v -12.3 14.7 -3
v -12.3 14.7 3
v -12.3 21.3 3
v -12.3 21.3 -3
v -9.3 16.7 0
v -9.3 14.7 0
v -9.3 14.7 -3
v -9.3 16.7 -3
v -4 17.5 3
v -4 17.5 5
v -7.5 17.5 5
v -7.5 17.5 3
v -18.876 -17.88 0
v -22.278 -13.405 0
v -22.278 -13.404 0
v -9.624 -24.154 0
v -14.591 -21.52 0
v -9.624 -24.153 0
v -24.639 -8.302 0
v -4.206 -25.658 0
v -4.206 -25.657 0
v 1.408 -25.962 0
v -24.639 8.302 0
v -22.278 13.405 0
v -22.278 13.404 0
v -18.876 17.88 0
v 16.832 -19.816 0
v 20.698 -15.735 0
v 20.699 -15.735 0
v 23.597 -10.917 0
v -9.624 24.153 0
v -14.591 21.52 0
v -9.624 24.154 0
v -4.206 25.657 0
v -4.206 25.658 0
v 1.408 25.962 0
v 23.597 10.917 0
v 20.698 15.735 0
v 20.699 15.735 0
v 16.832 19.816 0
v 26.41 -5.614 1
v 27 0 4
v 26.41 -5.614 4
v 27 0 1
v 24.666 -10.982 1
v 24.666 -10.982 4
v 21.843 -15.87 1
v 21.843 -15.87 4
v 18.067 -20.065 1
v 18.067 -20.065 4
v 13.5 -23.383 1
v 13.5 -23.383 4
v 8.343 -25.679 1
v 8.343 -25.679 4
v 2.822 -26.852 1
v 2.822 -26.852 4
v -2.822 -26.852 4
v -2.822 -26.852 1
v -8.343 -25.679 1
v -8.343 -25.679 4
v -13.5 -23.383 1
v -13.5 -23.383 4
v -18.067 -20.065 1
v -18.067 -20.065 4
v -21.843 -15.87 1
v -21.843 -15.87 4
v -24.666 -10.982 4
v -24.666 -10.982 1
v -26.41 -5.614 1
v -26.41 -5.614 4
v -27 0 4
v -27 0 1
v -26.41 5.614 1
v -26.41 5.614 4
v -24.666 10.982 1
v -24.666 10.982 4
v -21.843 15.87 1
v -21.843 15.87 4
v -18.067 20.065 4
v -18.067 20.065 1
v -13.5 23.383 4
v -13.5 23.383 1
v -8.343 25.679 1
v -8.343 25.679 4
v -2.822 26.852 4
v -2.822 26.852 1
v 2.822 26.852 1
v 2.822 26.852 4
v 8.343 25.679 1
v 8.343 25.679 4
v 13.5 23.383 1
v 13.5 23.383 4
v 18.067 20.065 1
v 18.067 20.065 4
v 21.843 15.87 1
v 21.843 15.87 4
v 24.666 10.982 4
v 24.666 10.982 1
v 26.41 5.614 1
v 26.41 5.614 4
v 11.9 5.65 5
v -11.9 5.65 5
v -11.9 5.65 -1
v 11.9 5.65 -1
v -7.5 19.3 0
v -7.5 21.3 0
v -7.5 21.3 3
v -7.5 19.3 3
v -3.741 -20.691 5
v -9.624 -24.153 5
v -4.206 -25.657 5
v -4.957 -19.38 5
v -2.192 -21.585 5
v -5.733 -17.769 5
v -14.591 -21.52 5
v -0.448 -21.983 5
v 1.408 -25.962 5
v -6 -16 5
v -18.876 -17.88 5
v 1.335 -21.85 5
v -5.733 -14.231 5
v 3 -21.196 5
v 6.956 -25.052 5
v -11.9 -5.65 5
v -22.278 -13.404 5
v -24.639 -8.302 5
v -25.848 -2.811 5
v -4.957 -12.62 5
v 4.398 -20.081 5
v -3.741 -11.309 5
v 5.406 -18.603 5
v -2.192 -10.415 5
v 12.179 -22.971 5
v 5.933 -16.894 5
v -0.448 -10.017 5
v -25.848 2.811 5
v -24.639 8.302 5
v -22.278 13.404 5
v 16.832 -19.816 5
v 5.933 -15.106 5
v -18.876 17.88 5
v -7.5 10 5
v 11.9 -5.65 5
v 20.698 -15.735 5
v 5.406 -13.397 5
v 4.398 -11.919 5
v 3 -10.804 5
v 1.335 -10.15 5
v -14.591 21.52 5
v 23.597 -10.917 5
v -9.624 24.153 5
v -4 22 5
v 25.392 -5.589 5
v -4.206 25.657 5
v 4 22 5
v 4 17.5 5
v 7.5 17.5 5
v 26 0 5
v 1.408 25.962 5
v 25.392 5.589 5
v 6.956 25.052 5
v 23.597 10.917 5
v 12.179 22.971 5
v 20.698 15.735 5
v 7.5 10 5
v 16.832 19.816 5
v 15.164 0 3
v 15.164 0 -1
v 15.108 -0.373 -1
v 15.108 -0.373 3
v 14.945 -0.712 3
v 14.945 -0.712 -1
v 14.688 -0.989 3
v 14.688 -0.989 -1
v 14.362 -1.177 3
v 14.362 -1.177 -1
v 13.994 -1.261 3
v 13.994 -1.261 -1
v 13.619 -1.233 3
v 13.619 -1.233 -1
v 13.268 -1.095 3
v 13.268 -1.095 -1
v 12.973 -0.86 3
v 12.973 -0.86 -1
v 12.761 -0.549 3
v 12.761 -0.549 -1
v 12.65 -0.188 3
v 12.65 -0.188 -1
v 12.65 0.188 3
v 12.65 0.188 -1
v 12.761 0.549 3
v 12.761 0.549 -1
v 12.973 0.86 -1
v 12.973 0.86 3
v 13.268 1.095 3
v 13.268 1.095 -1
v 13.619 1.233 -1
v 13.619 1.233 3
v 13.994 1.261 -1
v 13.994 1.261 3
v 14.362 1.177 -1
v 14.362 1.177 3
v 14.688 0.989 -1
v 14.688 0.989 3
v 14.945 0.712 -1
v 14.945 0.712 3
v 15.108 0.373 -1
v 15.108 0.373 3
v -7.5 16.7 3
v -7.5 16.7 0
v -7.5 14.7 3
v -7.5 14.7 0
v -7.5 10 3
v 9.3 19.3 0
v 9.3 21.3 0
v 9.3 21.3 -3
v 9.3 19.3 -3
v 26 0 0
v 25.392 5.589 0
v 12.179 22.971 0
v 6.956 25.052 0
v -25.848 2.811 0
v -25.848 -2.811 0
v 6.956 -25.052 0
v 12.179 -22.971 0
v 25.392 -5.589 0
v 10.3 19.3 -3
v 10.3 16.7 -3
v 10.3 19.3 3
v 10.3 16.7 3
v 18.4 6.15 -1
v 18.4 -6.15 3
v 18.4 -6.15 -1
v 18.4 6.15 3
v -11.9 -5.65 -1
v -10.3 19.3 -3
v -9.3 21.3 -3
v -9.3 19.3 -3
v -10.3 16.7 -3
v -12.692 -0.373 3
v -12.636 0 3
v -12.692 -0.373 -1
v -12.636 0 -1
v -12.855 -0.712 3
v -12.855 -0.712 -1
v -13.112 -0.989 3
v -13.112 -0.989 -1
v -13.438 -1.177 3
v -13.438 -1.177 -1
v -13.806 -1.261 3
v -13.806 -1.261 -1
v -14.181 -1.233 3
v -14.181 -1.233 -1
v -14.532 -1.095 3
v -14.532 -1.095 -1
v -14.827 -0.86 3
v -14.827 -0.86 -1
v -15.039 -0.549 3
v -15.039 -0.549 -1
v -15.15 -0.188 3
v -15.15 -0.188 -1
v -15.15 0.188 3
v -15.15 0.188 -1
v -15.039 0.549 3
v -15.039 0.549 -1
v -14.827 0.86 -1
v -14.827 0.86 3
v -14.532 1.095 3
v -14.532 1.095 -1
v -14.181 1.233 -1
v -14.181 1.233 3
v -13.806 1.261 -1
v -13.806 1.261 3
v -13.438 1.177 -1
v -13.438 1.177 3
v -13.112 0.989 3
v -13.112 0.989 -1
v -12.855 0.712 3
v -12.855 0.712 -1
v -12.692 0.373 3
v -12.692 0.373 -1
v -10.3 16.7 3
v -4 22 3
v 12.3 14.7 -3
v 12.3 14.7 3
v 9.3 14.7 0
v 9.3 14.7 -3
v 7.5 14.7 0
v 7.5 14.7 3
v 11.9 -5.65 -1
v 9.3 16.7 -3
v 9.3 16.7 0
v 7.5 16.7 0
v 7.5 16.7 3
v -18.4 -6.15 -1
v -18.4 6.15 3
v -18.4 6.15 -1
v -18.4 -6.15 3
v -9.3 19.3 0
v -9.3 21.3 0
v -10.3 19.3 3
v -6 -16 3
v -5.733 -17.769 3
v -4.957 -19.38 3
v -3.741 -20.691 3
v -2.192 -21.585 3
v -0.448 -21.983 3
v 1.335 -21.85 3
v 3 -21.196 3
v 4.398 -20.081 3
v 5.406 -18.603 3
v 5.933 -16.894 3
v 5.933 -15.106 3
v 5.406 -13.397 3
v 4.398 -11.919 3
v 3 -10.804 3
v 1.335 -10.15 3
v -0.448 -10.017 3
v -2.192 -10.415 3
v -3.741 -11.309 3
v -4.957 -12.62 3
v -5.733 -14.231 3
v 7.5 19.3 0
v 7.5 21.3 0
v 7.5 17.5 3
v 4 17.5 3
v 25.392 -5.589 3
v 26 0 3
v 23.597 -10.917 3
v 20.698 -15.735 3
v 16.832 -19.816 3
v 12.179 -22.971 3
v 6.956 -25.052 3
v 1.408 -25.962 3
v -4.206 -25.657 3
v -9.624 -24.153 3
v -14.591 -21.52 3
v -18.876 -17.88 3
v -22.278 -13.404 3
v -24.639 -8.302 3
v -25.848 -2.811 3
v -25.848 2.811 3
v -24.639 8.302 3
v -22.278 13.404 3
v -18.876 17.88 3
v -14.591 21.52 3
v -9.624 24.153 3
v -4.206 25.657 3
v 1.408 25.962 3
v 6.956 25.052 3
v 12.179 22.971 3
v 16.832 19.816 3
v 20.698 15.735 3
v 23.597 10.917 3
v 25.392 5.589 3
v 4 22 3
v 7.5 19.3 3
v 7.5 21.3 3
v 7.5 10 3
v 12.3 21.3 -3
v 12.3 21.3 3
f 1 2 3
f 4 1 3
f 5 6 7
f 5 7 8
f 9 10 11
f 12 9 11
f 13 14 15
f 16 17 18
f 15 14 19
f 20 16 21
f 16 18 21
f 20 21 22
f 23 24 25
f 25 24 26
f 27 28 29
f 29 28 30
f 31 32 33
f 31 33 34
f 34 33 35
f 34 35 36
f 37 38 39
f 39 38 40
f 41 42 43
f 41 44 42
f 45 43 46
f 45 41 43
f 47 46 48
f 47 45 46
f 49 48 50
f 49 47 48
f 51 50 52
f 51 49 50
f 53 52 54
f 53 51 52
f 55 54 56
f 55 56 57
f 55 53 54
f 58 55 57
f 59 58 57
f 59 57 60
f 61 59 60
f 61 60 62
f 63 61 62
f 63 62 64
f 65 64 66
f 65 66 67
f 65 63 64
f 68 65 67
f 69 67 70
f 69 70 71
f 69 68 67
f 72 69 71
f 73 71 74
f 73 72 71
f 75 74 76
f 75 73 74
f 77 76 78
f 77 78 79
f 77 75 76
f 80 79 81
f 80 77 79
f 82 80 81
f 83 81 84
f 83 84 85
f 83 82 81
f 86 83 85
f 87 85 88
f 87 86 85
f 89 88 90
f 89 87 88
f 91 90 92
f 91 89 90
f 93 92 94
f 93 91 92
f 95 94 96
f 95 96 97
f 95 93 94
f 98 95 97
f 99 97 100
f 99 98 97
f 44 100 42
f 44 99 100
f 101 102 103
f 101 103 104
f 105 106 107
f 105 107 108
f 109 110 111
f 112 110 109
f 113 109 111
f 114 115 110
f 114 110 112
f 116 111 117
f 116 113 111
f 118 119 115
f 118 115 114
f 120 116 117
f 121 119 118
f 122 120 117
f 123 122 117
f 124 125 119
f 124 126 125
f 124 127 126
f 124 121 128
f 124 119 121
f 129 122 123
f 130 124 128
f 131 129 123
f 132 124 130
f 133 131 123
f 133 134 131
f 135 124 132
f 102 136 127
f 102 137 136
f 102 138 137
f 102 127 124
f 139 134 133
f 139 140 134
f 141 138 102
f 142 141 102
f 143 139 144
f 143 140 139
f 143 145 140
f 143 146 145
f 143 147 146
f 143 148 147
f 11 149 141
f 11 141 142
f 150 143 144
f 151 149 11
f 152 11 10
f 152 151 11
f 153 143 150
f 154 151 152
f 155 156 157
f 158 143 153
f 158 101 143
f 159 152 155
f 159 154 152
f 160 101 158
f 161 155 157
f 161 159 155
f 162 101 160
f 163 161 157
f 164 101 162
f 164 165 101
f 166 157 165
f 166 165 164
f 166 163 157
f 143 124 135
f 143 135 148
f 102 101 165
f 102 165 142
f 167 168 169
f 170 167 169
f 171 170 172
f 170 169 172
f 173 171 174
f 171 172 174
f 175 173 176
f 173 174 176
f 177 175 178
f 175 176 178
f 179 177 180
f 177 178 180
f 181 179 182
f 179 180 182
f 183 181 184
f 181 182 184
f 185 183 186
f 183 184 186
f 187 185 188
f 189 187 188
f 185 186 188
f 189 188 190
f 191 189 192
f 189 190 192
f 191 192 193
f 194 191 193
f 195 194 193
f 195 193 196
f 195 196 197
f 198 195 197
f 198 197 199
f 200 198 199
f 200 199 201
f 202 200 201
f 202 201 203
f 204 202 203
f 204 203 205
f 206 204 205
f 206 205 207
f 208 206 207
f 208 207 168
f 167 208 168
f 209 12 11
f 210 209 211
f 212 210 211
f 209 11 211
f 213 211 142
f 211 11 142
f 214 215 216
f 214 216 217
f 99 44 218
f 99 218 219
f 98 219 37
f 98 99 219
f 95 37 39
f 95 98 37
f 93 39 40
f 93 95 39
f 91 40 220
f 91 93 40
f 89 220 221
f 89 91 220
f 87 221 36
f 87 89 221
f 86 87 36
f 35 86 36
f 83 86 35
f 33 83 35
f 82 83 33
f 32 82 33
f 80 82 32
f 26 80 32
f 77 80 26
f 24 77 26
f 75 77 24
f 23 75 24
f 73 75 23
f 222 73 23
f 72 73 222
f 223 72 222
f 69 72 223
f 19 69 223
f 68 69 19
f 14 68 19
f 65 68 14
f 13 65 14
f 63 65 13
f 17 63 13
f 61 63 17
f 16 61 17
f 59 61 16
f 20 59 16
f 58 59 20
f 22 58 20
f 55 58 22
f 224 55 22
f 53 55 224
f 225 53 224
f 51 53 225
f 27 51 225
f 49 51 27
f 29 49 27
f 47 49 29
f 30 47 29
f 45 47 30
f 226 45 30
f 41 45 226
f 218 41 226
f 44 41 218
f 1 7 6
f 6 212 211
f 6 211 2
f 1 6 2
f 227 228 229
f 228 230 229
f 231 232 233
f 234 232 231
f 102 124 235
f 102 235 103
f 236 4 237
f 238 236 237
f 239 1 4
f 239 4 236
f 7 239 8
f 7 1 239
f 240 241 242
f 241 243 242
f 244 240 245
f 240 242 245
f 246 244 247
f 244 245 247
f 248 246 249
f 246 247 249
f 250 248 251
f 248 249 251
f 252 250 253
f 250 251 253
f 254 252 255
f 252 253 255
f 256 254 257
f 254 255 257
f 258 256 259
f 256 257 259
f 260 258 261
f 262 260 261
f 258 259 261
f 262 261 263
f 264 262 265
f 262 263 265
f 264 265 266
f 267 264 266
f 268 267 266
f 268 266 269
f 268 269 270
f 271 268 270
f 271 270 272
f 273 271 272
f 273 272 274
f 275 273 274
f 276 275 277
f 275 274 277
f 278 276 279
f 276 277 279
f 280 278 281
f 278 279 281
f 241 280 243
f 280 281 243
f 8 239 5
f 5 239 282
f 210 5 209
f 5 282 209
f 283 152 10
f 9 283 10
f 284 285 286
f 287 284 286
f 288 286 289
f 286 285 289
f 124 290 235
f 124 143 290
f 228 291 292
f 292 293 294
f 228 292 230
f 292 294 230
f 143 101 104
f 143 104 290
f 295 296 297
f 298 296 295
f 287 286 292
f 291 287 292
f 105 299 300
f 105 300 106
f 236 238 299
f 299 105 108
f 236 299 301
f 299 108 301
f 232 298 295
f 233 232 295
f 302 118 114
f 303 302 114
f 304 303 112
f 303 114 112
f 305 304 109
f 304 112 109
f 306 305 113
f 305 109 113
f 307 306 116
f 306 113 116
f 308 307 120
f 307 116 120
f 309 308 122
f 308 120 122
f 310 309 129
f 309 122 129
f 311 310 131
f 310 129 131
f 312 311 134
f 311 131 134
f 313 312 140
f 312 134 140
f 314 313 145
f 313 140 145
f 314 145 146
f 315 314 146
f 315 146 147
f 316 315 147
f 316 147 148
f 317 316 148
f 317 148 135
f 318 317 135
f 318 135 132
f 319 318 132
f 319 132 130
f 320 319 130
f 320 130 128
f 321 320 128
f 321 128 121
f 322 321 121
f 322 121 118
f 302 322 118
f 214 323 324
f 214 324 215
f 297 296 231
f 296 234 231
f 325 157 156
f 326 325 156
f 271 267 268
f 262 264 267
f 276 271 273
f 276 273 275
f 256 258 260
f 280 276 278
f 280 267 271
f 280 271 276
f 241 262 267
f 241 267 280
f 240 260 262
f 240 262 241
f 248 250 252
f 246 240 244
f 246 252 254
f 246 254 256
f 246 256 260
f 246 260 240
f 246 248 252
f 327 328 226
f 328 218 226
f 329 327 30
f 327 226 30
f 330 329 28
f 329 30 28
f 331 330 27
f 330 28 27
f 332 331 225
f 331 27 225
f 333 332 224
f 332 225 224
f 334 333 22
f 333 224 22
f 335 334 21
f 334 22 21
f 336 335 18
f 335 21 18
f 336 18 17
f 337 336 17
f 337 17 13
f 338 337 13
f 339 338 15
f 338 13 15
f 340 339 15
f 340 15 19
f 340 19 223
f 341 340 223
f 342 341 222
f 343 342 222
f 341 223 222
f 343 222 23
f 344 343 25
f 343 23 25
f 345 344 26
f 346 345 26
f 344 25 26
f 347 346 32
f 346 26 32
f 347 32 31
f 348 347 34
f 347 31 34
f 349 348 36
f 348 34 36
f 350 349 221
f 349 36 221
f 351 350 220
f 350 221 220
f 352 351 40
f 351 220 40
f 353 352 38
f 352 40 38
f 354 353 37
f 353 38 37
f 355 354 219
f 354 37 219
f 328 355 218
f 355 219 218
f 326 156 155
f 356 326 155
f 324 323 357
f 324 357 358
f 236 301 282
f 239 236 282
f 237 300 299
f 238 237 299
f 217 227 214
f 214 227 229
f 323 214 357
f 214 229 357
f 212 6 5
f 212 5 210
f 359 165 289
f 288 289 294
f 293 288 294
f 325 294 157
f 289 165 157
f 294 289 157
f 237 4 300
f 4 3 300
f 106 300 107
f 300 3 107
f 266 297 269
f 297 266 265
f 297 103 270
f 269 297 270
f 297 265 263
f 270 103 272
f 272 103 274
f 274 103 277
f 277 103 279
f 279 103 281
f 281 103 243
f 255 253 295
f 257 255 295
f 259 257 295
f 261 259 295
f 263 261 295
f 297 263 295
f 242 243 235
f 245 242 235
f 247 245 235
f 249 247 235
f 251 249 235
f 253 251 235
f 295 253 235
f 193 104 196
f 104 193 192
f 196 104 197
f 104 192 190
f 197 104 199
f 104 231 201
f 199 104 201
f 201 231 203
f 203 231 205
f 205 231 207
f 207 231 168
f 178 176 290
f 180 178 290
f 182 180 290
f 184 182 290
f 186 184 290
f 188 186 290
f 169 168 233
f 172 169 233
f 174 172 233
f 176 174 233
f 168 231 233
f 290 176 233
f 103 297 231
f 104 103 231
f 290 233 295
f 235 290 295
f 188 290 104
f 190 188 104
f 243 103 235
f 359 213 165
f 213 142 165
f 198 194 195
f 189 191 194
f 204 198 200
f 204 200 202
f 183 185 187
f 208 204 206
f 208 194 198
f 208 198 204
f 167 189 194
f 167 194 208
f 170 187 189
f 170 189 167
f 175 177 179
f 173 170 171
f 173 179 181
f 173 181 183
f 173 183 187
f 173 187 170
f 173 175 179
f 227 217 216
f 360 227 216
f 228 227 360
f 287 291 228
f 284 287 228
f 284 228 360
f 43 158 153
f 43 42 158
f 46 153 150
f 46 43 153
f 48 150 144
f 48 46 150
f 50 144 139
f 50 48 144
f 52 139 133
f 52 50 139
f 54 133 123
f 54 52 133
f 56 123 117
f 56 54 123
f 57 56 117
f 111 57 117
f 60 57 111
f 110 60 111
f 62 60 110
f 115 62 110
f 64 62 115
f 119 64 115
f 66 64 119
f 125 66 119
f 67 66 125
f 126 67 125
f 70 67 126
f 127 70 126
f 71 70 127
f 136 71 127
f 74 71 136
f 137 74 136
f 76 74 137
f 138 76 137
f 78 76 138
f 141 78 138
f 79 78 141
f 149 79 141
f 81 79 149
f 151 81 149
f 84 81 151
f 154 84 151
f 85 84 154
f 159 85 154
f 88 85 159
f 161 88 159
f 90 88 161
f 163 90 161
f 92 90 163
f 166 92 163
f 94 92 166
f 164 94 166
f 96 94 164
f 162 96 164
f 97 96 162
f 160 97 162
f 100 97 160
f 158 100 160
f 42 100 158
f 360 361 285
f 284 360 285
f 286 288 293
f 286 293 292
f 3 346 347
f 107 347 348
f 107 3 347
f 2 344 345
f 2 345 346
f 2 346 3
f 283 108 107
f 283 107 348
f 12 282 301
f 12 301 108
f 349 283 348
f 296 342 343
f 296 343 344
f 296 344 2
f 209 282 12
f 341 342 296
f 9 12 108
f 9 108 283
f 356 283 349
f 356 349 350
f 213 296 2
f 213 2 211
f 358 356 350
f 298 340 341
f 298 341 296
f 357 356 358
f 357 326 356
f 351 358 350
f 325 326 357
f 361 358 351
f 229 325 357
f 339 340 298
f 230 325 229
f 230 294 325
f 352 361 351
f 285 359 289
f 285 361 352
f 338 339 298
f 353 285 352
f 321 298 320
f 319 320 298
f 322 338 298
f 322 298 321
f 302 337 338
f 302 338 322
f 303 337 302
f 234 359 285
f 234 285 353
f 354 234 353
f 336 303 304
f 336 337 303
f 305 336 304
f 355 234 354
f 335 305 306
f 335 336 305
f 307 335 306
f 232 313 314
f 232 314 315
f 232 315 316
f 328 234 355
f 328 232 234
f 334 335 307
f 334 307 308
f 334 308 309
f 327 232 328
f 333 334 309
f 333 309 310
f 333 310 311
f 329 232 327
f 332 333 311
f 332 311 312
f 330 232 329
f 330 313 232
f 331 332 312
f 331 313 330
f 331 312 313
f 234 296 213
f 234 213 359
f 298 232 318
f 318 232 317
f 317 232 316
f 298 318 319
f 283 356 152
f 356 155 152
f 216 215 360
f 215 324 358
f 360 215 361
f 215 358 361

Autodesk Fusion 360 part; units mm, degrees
sketch "Boceto1" plane through (0, 0, 0) normal (0, 0, 1) x (1, 0, 0)
  circle A0 centre (0, 0) radius 27
  dimension "d1" = 54
extrude "Extruir1" add sketch "Boceto1" along normal blind 5
sketch "Boceto2" plane through (0, 0, 0) normal (0, 0, -1) x (1, 0, 0)
  circle A0 centre (0, 0) radius 27
  circle A1 centre (0, 0) radius 26
  dimension "d6" = 52
extrude "Extruir2" cut sketch "Boceto2" against normal blind 3 contours A1
sketch "Boceto3" plane through (0, 0, 5) normal (0, 0, 1) x (-1, 0, 0)
  circle A0 centre (0, 0) radius 27
  line L0 (-11.4, 5.15) -> (11.4, 5.15)
  line L1 (11.4, 5.15) -> (11.4, -5.15)
  line L2 (11.4, -5.15) -> (-11.4, -5.15)
  line L3 (-11.4, -5.15) -> (-11.4, 5.15)
  line L4 (-11.4, 5.15) -> (11.4, -5.15) construction
  line L5 (11.4, 5.15) -> (-11.4, -5.15) construction
  line L6 (0, -27) -> (0, 27) construction
  line L7 (0, 5.15) -> (0, 16) construction
  circle A1 centre (0, 16) radius 6
  dimension "d9" = 10.3
  dimension "d10" = 22.8
  dimension "d11" = 12
extrude "Extruir3" cut sketch "Boceto3" against normal blind 3 contours L0 L1 L2 L3 | A1
sketch "Boceto4" plane through (0, 0, 3) normal (0, 0, -1) x (1, 0, 0)
  circle A0 centre (0, 16) radius 6
  line L0 (-11.4, -5.15) -> (-11.4, 5.15)
  line L1 (-11.4, 5.15) -> (11.4, 5.15)
  line L2 (11.4, 5.15) -> (11.4, -5.15)
  line L3 (11.4, -5.15) -> (-11.4, -5.15)
  circle A1 centre (0, 0) radius 26
  line L4 (-12.4, 6.15) -> (12.4, 6.15)
  line L5 (12.4, 6.15) -> (12.4, -6.15)
  line L6 (12.4, -6.15) -> (-12.4, -6.15)
  line L7 (-12.4, -6.15) -> (-12.4, 6.15)
  line L8 (-12.4, 6.15) -> (12.4, -6.15) construction
  line L9 (12.4, 6.15) -> (-12.4, -6.15) construction
  dimension "d14" = 24.8
  dimension "d15" = 12.3
extrude "Extruir4" add sketch "Boceto4" along normal blind 4 contours L4 L5 L6 L7
chamfer "Chaflán1" distance 1 angle 45 1 edges at (-25.1728, -9.7636, 5)
extrude "Extruir5" add 1 faces at (12.4, -2.05, 0.3333) along direction (1, 0, 0) blind 5
extrude "Extruir6" add 1 faces at (-12.4, 2.05, 0.3333) along direction (-1, 0, 0) blind 5
extrude "Extruir7" add 1 faces at (17.4, -2.05, 0.3333) along direction (1, 0, 0) blind 1
extrude "Extruir8" add 1 faces at (-17.4, 2.05, 0.3333) along direction (-1, 0, 0) blind 1
chamfer "Chaflán2" distance 1 angle 45 1 edges at (-25.1728, -9.7636, 0)
sketch "Boceto5" plane through (0, 0, 5) normal (0, 0, 1) x (-1, 0, 0)
  line L0 (11.4, 5.15) -> (11.4, -5.15)
  line L1 (11.4, -5.15) -> (-11.4, -5.15)
  line L2 (-11.4, -5.15) -> (-11.4, 5.15)
  line L3 (-11.4, 5.15) -> (11.4, 5.15)
  circle A0 centre (0, 16) radius 6
  circle A1 centre (0, 0) radius 26
  line L4 (0, 0) -> (0, -16)
  line L5 (7.5, -10) -> (-7.5, -10)
  line L6 (-7.5, -10) -> (-7.5, -22)
  line L7 (-7.5, -22) -> (7.5, -22)
  line L8 (7.5, -22) -> (7.5, -10)
  line L9 (7.5, -10) -> (-7.5, -22) construction
  line L10 (-7.5, -10) -> (7.5, -22) construction
  line L11 (-7.5, -10) -> (-7.5, -17.5)
  line L12 (-7.5, -17.5) -> (7.5, -17.5)
  line L13 (0, -17.5) -> (-4, -17.5)
  line L14 (-4, -17.5) -> (-4, -22)
  line L15 (-4, -22) -> (4, -22)
  line L16 (4, -22) -> (4, -17.5)
  point P0 (0, -16)
  dimension "d28" = 16
  dimension "d29" = 15
  dimension "d30" = 12
  dimension "d31" = 7.5
extrude "Extruir9" cut sketch "Boceto5" against normal blind 2 contours L5 L6 L8 L11 L12 L13 | L7 L12 L13 L14 L15 L16
sketch "Boceto6" plane through (0, 0, 3) normal (0, 0, -1) x (1, 0, 0)
  line L0 (-4, -17.5) -> (-7.5, -17.5)
  line L1 (-7.5, -17.5) -> (-7.5, -10)
  line L2 (-7.5, -10) -> (7.5, -10)
  line L3 (7.5, -10) -> (7.5, -17.5)
  line L4 (7.5, -17.5) -> (4, -17.5)
  line L5 (4, -17.5) -> (4, -22)
  line L6 (4, -22) -> (-4, -22)
  line L7 (-4, -22) -> (-4, -17.5)
  line L8 (-18.4, 6.15) -> (18.4, 6.15)
  line L9 (18.4, 6.15) -> (18.4, -6.15)
  line L10 (18.4, -6.15) -> (-18.4, -6.15)
  line L11 (-18.4, -6.15) -> (-18.4, 6.15)
  circle A0 centre (0, 16) radius 6
  circle A1 centre (0, 0) radius 26
  line L12 (4, -22) -> (4, -19)
  line L13 (0, -19) -> (10, -19)
  line L14 (10.3, -19.3) -> (10.3, -16.7)
  line L15 (-10.3, -16.7) -> (10.3, -16.7)
  line L16 (-10.3, -19.3) -> (-10.3, -16.7)
  line L17 (10.3, -19.3) -> (-10.3, -19.3)
  line L18 (12.3, -21.3) -> (12.3, -14.7)
  line L19 (-12.3, -14.7) -> (12.3, -14.7)
  line L20 (-12.3, -21.3) -> (-12.3, -14.7)
  line L21 (12.3, -21.3) -> (-12.3, -21.3)
  dimension "d35" = -2
extrude "Extruir10" add sketch "Boceto6" along normal blind 3 contours L1 L7 L15 L16 L17 L19 L20 L21 | L3 L5 L12 L14 L15 L17 L18 L19 L21
sketch "Boceto7" plane through (0, 0, 0) normal (0, 0, -1) x (1, 0, 0)
  line L0 (7.5, -14.7) -> (7.5, -16.7)
  line L1 (7.5, -16.7) -> (10.3, -16.7)
  line L2 (10.3, -16.7) -> (10.3, -19.3)
  line L3 (10.3, -19.3) -> (4, -19.3)
  line L4 (4, -19.3) -> (4, -21.3)
  line L5 (4, -21.3) -> (12.3, -21.3)
  line L6 (12.3, -21.3) -> (12.3, -14.7)
  line L7 (12.3, -14.7) -> (7.5, -14.7)
  line L8 (4, -19.3) -> (7.5002, -19.3)
  line L9 (7.5002, -19.3) -> (7.5002, -21.3)
  line L10 (7.5002, -21.3) -> (4, -21.3)
  line L11 (4, -21.3) -> (4, -19.3)
extrude "Extruir11" cut sketch "Boceto7" against normal blind 3 contours L3 L4 L5 L8 L9 L10 L11
sketch "Boceto8" plane through (0, 0, 0) normal (0, 0, -1) x (1, 0, 0)
  line L0 (-12.3, -21.3) -> (-4, -21.3)
  line L1 (-4, -21.3) -> (-4, -19.3)
  line L2 (-4, -19.3) -> (-10.3, -19.3)
  line L3 (-10.3, -19.3) -> (-10.3, -16.7)
  line L4 (-10.3, -16.7) -> (-7.5, -16.7)
  line L5 (-7.5, -16.7) -> (-7.5, -14.7)
  line L6 (-7.5, -14.7) -> (-12.3, -14.7)
  line L7 (-12.3, -14.7) -> (-12.3, -21.3)
  line L8 (-4, -21.3) -> (-7.5, -21.3)
  line L9 (-7.5, -21.3) -> (-7.5, -19.3)
  line L10 (-7.5, -19.3) -> (-4, -19.3)
  line L11 (-4, -19.3) -> (-4, -21.3)
  line L12 (-12.3, -14.7) -> (-10.3, -14.7)
  line L13 (-10.3, -14.7) -> (-10.3, -21.3)
  line L14 (-10.3, -21.3) -> (-12.3, -21.3)
  line L15 (-12.3, -21.3) -> (-12.3, -14.7)
  line L16 (-10.3, -14.7) -> (-9.3, -14.7)
  line L17 (-9.3, -14.7) -> (-9.3, -16.7)
  line L18 (-9.3, -16.7) -> (-10.3, -16.7)
  line L19 (-10.3, -16.7) -> (-10.3, -14.7)
  line L20 (-10.3, -21.3) -> (-9.3, -21.3)
  line L21 (-9.3, -21.3) -> (-9.3, -19.3)
  line L22 (-9.3, -19.3) -> (-10.3, -19.3)
  line L23 (-10.3, -19.3) -> (-10.3, -21.3)
  dimension "d42" = 1
  dimension "d43" = 1
extrude "Extruir12" cut sketch "Boceto8" against normal blind 3 contours L0 L1 L2 L8 L9 L10 L11
extrude "Extruir14" add sketch "Boceto8" along normal blind 3 contours L0 L3 L6 L7 L12 L13 L14 L15 L19 L23 | L0 L2 L13 L20 L21 L22 L23 | L4 L6 L13 L16 L17 L18 L19
sketch "Boceto9" plane through (0, 0, 0) normal (0, 0, -1) x (1, 0, 0)
  line L0 (7.5002, -19.3) -> (7.5002, -21.3)
  line L1 (7.5002, -21.3) -> (12.3, -21.3)
  line L2 (12.3, -21.3) -> (12.3, -14.7)
  line L3 (12.3, -14.7) -> (7.5, -14.7)
  line L4 (7.5, -14.7) -> (7.5, -16.7)
  line L5 (7.5, -16.7) -> (10.3, -16.7)
  line L6 (10.3, -16.7) -> (10.3, -19.3)
  line L7 (10.3, -19.3) -> (7.5002, -19.3)
  line L8 (12.3, -14.7) -> (9.3, -14.7)
  line L9 (9.3, -14.7) -> (9.3, -16.7)
  line L10 (9.3, -16.7) -> (12.3, -16.7)
  line L11 (12.3, -16.7) -> (12.3, -14.7)
  line L12 (12.3, -21.3) -> (9.3, -21.3)
  line L13 (9.3, -21.3) -> (9.3, -19.3)
  line L14 (9.3, -19.3) -> (12.3, -19.3)
  line L15 (12.3, -19.3) -> (12.3, -21.3)
  dimension "d48" = 3
  dimension "d49" = 3
extrude "Extruir15" add sketch "Boceto9" along normal blind 3 contours L1 L2 L7 L12 L13 L14 L15 | L2 L6 L10 L14 | L2 L3 L5 L8 L9 L10 L11
sketch "Boceto10" plane through (0, 0, -1) normal (0, 0, -1) x (1, 0, 0)
  line L0 (11.4, 5.15) -> (11.4, -5.15)
  line L1 (11.4, -5.15) -> (-11.4, -5.15)
  line L2 (-11.4, -5.15) -> (-11.4, 5.15)
  line L3 (-11.4, 5.15) -> (11.4, 5.15)
  line L4 (-18.4, -6.15) -> (18.4, -6.15)
  line L5 (18.4, -6.15) -> (18.4, 6.15)
  line L6 (18.4, 6.15) -> (-18.4, 6.15)
  line L7 (-18.4, 6.15) -> (-18.4, -6.15)
  line L8 (-11.4, 5.15) -> (-16.4, 5.15)
  line L9 (-16.4, 5.15) -> (-16.4, -5.15)
  line L10 (-16.4, -5.15) -> (-11.4, -5.15)
  line L11 (-11.4, -5.15) -> (-11.4, 5.15)
  line L12 (11.4, 5.15) -> (16.4, 5.15)
  line L13 (16.4, 5.15) -> (16.4, -5.15)
  line L14 (16.4, -5.15) -> (11.4, -5.15)
  line L15 (11.4, -5.15) -> (11.4, 5.15)
  circle A0 centre (-13.9, 0) radius 1.5
  circle A1 centre (13.9, 0) radius 1.5
  dimension "d52" = 5
  dimension "d53" = 5
  dimension "d54" = 3
  dimension "d55" = 3
extrude "Extruir16" cut sketch "Boceto10" against normal blind 4 contours A0 | A1
thread "Rosca1" "ISO Metric profile 3.0 M3x0.5 6H" major diameter 3.086 minor diameter 2.529 pitch 0.5 angle 60 resizes the face on face at (15.3925, 0.1494, 0.3333)
thread "Rosca2" "ISO Metric profile 3.0 M3x0.5 6H" major diameter 3.086 minor diameter 2.529 pitch 0.5 angle 60 resizes the face on face at (-12.4019, 0.0748, 1.6667)
sketch "Boceto11" plane through (0, 0, 5) normal (0, 0, 1) x (-1, 0, 0)
  line L0 (7.5, -17.5) -> (4, -17.5)
  line L1 (4, -17.5) -> (4, -22)
  line L2 (4, -22) -> (-4, -22)
  line L3 (-4, -22) -> (-4, -17.5)
  line L4 (-4, -17.5) -> (-7.5, -17.5)
  line L5 (-7.5, -17.5) -> (-7.5, -10)
  line L6 (-7.5, -10) -> (7.5, -10)
  line L7 (7.5, -10) -> (7.5, -17.5)
  line L8 (11.4, 5.15) -> (11.4, -5.15)
  line L9 (11.4, -5.15) -> (-11.4, -5.15)
  line L10 (-11.4, -5.15) -> (-11.4, 5.15)
  line L11 (-11.4, 5.15) -> (11.4, 5.15)
  circle A0 centre (0, 16) radius 6
  circle A1 centre (0, 0) radius 26
  line L12 (11.9, -5.65) -> (-11.9, -5.65)
  line L13 (-11.9, -5.65) -> (-11.9, 5.65)
  line L14 (-11.9, 5.65) -> (11.9, 5.65)
  line L15 (11.9, 5.65) -> (11.9, -5.65)
  dimension "d58" = -0.5
extrude "Extruir17" cut sketch "Boceto11" against normal blind 10 contours L12 L13 L14 L15
extrude "Extruir13" [suppressed]
equation "d1 = Dex"
equation "Dex = 54 mm"
equation "Din = 52 mm"
equation "d6 = Din"
